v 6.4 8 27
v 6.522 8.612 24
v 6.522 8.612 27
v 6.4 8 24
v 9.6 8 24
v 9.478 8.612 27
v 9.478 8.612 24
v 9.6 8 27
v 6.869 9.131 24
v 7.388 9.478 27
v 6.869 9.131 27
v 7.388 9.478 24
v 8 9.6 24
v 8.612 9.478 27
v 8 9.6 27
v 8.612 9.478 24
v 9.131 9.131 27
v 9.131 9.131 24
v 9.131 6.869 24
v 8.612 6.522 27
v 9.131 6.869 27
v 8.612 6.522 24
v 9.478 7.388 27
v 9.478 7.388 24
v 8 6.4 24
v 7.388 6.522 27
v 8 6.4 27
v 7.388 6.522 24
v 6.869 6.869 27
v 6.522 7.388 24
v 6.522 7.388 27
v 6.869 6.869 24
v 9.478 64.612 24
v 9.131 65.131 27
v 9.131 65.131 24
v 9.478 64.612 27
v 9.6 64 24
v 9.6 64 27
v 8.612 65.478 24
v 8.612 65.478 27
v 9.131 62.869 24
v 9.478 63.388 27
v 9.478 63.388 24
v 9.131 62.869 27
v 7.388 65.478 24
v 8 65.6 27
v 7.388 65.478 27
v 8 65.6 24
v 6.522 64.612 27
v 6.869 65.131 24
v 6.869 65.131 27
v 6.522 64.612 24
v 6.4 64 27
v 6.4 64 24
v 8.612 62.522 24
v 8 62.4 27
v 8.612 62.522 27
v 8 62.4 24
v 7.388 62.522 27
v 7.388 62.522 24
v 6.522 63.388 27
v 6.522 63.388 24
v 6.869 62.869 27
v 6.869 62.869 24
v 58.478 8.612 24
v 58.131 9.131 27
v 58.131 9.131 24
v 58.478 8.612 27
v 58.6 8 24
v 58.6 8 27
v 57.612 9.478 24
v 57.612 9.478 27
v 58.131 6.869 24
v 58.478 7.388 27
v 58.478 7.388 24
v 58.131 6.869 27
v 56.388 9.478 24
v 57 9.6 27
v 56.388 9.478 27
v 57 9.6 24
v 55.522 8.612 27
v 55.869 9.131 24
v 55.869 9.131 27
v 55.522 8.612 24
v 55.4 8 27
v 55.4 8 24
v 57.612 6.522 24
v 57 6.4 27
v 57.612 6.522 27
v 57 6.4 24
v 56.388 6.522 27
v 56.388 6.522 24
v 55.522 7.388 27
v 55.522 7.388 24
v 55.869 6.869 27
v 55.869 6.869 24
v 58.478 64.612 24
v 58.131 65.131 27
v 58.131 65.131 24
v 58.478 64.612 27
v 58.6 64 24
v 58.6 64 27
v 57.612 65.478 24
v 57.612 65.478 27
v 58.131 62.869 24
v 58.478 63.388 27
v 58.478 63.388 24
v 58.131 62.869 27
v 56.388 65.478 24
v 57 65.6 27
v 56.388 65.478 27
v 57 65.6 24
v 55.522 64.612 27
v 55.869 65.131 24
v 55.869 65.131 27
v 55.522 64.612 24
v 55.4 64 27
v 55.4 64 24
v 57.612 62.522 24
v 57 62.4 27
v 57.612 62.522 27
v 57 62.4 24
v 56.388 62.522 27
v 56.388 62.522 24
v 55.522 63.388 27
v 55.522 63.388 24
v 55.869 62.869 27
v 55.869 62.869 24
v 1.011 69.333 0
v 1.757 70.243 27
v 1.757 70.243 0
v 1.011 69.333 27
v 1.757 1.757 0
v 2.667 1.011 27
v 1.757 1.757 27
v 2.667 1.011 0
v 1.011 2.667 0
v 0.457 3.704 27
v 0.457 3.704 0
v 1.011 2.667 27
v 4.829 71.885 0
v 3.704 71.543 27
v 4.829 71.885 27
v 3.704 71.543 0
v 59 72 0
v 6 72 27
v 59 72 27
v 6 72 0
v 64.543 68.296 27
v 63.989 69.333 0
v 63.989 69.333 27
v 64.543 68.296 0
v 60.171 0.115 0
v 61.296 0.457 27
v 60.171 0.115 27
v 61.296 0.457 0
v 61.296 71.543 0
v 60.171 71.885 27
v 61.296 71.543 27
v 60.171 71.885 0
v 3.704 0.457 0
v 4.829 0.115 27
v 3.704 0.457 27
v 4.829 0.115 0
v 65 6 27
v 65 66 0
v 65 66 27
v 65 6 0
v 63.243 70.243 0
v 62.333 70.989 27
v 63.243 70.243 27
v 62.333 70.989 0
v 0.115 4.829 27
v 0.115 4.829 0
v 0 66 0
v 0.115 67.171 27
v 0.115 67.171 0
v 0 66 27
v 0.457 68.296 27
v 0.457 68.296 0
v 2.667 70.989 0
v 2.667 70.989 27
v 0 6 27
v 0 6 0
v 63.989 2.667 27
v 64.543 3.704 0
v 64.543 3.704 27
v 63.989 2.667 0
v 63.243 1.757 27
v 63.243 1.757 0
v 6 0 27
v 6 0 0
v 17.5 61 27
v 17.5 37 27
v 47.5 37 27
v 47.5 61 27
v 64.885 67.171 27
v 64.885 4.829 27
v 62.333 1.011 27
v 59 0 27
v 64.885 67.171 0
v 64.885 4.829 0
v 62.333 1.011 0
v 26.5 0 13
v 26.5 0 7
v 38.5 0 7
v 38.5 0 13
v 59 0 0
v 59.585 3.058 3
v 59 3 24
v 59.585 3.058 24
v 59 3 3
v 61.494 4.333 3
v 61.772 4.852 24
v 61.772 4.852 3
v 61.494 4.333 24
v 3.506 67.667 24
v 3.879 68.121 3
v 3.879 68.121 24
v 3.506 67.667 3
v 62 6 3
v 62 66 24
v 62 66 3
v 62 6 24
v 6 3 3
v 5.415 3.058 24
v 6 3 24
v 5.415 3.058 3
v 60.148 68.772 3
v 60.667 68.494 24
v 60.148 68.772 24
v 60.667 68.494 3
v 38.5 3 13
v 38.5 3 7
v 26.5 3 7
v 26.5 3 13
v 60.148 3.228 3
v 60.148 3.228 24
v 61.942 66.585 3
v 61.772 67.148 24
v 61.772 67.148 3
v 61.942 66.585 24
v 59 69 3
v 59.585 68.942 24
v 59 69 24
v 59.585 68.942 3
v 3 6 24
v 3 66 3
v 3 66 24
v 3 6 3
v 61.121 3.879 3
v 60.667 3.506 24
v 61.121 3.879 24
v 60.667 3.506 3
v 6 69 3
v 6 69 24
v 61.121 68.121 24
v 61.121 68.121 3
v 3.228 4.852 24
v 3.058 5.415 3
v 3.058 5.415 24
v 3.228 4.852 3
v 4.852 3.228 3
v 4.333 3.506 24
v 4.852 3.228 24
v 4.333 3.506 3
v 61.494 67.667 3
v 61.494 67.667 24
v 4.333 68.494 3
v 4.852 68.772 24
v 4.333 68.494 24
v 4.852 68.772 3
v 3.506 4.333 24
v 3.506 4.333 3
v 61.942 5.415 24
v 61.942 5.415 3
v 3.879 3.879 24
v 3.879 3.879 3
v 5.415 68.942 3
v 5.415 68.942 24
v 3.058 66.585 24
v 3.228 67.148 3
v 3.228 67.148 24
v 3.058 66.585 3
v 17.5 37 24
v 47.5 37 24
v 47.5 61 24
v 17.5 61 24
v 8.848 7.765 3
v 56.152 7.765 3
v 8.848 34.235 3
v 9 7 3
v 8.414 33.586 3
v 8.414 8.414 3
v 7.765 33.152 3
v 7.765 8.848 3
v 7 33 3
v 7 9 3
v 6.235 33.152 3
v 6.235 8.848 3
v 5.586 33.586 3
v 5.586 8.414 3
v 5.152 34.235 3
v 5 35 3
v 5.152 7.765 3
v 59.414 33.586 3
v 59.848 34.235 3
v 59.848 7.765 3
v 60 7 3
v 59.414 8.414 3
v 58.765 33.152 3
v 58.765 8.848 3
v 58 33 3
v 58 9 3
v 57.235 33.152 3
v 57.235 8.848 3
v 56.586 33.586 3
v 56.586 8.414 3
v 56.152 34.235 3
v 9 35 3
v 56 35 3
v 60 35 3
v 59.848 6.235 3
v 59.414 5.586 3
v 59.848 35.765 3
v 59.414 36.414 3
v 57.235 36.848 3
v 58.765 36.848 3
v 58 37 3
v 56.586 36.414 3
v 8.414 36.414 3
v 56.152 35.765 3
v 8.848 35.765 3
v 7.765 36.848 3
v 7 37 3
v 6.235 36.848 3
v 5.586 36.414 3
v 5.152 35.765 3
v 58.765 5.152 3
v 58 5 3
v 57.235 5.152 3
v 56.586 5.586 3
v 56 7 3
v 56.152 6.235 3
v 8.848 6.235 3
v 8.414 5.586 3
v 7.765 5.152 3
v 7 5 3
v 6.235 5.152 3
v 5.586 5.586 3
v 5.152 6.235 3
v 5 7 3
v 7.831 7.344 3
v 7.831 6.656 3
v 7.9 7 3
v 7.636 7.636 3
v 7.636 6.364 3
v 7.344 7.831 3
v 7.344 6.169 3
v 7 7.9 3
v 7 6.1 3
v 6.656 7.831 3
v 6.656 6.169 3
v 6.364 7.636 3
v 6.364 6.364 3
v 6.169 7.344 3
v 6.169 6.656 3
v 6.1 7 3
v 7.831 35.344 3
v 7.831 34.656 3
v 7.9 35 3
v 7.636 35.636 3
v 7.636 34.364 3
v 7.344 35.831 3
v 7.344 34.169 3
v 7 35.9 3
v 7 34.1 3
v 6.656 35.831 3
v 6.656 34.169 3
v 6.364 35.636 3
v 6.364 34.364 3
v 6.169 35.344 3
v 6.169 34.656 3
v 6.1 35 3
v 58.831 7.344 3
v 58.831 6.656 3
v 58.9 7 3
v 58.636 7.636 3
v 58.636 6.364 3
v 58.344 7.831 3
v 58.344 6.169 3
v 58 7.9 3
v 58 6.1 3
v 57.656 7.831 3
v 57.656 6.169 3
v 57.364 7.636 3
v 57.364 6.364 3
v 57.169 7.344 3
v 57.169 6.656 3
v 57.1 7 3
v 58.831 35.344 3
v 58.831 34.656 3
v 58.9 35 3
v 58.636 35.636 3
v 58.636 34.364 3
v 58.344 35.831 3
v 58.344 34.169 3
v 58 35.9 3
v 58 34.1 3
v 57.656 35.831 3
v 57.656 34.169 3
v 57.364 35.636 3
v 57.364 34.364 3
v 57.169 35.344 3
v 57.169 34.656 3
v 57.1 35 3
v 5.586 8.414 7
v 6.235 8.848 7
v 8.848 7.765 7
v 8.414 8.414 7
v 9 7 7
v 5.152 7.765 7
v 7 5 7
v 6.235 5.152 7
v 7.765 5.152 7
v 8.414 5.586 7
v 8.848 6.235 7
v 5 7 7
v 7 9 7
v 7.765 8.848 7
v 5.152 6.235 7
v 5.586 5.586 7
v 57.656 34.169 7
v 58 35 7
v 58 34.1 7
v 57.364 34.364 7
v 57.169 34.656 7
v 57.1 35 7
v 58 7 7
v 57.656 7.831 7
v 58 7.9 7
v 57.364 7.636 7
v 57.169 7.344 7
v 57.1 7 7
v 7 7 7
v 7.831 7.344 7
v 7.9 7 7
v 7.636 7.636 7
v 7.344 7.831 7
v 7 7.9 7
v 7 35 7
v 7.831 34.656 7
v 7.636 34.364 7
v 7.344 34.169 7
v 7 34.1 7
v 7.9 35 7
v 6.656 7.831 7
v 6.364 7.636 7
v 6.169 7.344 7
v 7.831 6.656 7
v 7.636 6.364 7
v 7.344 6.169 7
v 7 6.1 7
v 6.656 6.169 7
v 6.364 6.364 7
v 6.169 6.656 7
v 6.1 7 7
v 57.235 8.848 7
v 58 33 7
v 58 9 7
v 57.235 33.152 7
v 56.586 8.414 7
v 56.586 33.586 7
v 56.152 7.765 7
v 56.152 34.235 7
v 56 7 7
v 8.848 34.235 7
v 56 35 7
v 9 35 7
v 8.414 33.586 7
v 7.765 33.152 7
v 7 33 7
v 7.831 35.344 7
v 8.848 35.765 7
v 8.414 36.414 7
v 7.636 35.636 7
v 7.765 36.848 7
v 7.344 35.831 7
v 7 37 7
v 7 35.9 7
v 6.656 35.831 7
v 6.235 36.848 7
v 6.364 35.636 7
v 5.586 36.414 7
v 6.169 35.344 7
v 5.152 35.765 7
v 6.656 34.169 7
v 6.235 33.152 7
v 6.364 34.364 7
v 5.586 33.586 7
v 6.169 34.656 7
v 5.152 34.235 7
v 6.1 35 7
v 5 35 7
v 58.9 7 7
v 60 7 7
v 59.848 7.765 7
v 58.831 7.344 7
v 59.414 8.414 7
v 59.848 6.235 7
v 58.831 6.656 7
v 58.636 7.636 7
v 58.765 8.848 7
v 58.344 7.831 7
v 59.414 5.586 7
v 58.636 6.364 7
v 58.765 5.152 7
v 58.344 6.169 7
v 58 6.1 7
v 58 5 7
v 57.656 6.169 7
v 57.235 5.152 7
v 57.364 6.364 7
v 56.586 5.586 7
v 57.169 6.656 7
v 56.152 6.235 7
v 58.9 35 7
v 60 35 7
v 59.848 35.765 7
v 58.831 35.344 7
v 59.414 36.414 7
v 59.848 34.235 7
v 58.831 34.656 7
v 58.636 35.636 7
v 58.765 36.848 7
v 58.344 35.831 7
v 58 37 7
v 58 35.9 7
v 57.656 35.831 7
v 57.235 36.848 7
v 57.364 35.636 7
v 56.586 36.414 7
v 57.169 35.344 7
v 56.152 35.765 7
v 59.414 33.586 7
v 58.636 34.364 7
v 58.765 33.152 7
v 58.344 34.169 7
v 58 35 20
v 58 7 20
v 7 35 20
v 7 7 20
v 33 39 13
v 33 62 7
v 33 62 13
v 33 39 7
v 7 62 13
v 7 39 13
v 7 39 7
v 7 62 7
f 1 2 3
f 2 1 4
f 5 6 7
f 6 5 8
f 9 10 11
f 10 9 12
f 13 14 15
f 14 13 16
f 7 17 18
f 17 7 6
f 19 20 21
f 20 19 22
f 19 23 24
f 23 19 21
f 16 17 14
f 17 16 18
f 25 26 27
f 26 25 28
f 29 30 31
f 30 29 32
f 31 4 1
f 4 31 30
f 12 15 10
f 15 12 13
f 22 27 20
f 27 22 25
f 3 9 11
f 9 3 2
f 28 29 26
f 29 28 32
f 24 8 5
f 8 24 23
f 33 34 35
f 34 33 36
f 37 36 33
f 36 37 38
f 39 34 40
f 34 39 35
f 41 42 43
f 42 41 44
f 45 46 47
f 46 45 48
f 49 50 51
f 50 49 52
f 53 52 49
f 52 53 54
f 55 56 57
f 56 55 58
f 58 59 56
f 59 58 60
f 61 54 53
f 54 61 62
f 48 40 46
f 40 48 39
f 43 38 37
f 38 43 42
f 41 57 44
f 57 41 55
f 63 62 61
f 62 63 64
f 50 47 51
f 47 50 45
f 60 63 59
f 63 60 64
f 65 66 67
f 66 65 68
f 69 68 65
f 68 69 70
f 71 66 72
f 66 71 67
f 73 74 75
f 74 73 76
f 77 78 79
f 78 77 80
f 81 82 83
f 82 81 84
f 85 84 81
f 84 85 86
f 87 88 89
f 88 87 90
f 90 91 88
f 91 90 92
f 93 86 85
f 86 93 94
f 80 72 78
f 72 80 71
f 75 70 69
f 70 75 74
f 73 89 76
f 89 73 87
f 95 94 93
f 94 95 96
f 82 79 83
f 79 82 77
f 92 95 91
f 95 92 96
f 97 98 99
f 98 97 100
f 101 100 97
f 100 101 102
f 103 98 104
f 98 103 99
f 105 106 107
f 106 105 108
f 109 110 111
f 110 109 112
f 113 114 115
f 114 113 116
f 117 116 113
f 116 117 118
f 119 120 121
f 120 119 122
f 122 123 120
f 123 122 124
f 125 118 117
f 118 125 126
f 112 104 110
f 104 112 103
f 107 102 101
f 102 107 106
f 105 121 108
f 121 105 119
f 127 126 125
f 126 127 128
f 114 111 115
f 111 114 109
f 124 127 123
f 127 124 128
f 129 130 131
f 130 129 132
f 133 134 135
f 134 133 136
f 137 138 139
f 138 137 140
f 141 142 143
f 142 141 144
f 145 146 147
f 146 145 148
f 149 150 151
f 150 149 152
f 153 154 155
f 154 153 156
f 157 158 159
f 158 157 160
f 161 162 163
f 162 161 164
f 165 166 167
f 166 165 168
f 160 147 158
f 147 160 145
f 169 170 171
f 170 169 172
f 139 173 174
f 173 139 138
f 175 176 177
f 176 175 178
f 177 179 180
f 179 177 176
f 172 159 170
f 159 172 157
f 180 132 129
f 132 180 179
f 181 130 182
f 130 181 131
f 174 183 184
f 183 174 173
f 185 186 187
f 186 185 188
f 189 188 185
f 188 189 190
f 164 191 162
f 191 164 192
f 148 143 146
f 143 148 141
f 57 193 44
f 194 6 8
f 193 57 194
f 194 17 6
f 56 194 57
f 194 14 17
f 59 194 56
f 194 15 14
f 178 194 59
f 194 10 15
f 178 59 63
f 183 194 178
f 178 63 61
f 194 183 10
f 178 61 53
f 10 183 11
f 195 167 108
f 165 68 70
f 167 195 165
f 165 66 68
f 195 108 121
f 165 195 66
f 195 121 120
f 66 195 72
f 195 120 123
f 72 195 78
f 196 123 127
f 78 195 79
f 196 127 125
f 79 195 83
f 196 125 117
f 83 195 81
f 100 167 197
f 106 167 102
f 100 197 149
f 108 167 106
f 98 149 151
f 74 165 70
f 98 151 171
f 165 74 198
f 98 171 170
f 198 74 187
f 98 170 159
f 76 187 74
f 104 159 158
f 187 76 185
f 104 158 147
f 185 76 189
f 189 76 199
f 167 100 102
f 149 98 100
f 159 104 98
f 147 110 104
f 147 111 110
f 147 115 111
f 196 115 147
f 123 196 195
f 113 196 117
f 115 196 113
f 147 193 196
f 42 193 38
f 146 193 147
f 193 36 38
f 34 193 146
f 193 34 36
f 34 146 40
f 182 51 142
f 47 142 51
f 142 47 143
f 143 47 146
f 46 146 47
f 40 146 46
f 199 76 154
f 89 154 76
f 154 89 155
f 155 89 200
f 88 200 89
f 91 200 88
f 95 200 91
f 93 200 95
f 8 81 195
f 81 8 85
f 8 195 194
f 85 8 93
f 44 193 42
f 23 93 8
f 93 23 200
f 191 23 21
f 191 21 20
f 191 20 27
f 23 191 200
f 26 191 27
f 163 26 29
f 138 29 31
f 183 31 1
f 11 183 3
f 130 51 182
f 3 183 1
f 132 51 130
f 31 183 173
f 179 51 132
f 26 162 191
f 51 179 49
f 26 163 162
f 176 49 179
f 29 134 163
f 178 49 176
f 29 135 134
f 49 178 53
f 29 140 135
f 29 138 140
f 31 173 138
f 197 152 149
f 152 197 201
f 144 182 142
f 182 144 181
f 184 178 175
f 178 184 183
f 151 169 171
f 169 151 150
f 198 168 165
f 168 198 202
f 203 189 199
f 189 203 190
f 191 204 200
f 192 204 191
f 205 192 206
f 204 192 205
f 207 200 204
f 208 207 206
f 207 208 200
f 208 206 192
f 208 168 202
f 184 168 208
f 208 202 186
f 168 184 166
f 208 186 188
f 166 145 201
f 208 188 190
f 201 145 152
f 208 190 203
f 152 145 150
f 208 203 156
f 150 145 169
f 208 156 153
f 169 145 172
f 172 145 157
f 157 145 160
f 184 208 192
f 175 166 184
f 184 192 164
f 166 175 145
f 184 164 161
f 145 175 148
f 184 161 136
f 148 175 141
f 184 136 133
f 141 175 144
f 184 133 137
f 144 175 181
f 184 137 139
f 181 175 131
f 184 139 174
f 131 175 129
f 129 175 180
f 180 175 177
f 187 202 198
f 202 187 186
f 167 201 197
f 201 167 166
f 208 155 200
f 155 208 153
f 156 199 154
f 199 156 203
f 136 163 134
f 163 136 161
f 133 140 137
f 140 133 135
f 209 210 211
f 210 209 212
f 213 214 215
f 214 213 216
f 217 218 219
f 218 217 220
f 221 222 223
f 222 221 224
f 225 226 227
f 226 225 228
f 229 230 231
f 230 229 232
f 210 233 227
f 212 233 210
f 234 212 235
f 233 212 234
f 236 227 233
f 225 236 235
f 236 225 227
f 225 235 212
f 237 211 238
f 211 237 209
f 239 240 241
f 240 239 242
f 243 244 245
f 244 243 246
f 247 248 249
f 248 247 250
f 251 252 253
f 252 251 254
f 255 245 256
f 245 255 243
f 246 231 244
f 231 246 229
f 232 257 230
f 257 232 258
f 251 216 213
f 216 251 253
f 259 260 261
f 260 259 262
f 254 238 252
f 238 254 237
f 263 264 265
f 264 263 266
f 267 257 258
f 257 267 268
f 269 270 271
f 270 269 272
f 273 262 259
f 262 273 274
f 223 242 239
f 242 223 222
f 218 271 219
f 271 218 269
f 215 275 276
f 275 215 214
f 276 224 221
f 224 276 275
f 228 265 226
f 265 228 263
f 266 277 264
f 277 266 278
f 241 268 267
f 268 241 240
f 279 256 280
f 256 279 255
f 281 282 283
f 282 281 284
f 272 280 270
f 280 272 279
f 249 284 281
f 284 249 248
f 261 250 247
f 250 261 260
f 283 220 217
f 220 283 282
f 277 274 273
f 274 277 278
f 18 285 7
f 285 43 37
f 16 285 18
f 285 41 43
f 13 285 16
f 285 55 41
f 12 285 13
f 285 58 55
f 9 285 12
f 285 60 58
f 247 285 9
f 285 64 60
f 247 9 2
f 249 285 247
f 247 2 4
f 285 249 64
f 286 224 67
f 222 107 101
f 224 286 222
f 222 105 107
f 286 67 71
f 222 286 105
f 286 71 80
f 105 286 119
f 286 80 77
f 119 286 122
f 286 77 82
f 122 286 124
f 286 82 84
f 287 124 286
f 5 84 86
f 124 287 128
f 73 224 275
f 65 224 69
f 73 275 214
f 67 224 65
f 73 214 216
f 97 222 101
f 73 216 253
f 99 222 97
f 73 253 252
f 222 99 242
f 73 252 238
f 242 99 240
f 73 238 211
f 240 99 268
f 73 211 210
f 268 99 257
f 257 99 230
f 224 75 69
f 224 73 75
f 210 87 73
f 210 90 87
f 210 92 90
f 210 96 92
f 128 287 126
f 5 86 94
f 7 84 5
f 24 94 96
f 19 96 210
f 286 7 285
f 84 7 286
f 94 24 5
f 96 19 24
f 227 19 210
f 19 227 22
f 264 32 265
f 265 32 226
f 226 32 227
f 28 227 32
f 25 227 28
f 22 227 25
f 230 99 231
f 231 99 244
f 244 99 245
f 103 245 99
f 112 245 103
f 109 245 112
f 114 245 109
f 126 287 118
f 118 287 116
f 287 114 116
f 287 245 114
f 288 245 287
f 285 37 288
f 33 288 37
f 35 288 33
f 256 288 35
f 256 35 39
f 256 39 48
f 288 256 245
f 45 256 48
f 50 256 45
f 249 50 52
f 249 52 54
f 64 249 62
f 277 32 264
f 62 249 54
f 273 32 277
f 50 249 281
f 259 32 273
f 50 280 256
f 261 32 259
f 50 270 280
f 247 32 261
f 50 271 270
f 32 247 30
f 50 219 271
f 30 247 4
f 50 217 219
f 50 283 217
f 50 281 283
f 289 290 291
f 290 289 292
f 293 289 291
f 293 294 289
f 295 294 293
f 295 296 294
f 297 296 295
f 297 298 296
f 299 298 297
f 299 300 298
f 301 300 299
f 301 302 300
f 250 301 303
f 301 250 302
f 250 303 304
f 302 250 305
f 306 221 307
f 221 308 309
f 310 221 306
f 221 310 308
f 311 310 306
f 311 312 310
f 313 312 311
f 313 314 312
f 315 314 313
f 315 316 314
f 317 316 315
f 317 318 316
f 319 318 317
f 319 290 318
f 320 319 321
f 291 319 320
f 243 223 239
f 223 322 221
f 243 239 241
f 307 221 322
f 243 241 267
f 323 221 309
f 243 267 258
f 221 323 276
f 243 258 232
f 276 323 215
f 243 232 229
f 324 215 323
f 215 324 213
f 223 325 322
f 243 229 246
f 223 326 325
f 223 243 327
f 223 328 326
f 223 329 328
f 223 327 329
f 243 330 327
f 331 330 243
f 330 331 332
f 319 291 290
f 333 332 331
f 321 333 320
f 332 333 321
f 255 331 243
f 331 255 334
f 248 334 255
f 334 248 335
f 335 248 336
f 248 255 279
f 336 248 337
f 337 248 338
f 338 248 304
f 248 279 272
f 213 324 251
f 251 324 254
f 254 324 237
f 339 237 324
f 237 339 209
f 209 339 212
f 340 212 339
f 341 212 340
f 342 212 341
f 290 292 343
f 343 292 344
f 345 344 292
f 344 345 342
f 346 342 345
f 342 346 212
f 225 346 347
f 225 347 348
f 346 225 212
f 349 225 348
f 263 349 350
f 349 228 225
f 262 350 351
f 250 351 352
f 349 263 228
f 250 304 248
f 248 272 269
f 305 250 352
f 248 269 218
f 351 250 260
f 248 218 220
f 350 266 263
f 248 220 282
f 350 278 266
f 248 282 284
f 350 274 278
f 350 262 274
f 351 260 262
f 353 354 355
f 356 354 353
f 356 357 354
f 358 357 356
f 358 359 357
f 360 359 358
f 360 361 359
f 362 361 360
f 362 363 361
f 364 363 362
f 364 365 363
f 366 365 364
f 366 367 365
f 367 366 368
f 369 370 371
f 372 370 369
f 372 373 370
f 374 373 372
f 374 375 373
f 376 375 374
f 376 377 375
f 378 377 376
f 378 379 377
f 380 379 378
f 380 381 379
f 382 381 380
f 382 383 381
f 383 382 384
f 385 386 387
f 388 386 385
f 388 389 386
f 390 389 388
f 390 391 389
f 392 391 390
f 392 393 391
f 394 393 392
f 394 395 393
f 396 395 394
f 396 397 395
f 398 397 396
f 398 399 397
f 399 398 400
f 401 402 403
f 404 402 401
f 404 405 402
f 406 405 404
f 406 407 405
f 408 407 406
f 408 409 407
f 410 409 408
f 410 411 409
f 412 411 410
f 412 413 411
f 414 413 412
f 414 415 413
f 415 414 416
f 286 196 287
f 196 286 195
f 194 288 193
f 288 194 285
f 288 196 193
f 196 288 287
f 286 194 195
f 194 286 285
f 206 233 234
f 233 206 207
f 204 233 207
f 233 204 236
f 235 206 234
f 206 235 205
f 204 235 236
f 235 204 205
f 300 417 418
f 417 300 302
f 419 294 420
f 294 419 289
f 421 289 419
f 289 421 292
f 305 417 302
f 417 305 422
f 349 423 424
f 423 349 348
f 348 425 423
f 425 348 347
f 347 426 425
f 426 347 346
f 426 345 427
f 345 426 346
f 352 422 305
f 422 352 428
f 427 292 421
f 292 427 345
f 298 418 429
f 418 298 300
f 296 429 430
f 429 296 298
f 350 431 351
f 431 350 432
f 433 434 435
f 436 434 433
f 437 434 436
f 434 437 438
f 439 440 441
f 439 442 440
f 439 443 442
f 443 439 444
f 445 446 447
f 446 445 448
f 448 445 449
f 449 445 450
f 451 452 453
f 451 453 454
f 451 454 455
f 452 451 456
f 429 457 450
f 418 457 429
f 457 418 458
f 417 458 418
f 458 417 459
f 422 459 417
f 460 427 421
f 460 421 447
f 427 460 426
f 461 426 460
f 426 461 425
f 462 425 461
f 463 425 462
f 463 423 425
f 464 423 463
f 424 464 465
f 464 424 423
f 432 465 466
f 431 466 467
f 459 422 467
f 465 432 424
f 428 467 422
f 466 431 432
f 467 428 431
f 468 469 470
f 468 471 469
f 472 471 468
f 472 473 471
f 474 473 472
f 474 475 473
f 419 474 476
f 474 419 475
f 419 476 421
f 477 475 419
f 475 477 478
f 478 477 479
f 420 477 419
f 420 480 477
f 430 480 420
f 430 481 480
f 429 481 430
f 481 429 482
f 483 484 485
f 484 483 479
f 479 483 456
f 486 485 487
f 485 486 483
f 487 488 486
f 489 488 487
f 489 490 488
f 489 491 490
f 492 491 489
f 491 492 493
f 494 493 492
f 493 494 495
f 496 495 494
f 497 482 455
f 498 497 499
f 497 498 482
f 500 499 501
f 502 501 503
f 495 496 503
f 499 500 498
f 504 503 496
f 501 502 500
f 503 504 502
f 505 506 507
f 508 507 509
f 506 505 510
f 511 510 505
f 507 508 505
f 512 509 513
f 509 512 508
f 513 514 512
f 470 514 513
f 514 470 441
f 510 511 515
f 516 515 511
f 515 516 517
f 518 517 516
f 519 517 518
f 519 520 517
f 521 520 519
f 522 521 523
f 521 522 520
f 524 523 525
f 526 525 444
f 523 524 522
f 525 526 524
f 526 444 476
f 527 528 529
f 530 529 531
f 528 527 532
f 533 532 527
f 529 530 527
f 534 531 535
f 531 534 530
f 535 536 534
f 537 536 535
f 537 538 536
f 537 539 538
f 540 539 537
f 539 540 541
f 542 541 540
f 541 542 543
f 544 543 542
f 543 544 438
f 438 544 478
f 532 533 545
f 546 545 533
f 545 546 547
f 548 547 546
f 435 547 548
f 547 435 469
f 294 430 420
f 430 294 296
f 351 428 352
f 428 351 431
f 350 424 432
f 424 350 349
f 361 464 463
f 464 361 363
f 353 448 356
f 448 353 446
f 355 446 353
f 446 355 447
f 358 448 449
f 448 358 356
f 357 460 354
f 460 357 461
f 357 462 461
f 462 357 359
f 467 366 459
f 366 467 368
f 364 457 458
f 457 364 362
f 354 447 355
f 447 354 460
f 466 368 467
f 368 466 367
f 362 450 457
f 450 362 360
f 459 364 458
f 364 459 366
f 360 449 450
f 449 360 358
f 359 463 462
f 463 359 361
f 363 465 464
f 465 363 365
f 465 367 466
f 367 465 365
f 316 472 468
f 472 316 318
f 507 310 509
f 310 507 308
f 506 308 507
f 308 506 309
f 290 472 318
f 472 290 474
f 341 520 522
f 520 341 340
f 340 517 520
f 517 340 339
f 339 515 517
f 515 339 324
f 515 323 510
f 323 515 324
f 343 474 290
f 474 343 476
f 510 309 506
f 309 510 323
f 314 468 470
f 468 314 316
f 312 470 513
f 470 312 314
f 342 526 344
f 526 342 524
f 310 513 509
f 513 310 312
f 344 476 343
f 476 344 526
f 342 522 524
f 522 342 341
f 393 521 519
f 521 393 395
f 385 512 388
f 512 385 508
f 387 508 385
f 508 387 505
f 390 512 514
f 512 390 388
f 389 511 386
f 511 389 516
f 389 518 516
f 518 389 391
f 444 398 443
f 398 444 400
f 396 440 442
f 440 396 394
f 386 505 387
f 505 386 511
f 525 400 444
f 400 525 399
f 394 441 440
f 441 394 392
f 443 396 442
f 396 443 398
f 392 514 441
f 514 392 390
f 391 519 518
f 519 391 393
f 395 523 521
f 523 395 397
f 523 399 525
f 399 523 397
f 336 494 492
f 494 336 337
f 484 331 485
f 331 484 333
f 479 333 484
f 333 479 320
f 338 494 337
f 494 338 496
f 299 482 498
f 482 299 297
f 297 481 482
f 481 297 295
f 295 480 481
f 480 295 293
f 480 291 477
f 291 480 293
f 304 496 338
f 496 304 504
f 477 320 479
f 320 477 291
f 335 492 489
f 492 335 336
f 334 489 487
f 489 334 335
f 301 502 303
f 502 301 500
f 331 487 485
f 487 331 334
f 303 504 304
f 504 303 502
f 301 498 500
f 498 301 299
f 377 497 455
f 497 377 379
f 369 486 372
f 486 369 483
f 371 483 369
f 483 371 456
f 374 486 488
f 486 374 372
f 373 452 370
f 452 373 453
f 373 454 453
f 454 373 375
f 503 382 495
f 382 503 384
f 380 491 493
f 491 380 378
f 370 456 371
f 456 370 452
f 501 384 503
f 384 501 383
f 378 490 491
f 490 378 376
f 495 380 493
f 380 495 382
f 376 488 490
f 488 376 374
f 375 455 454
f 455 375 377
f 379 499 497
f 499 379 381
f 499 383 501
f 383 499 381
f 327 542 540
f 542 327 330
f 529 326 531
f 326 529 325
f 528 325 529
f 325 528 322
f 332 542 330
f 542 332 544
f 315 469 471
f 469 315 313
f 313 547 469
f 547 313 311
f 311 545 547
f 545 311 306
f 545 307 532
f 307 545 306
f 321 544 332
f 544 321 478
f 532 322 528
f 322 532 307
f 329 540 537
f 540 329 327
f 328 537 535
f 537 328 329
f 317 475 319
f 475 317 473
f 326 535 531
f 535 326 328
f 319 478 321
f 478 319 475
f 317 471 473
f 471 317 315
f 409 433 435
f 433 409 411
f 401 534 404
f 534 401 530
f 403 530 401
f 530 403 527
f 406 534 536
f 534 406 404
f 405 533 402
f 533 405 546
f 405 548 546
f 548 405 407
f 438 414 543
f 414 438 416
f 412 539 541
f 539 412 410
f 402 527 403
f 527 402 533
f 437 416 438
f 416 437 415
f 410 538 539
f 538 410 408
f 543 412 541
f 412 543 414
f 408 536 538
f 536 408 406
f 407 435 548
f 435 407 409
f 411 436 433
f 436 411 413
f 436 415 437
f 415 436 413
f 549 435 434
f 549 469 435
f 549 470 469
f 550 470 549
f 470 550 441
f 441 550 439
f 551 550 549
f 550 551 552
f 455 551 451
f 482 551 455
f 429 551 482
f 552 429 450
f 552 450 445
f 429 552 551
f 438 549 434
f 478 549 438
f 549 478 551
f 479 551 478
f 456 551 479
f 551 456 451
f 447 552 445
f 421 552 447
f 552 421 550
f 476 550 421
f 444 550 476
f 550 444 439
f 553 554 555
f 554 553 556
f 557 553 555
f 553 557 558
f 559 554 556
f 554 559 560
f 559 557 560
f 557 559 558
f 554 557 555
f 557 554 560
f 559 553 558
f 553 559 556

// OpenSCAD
// Wildlife Telemetry Node — Enclosure v0.1
// Parametrizable — actualizar medidas cuando llegue el vernier
// Autor: Toshi — ISERI IPN Zacatenco

// =====================
// PARÁMETROS (editar aquí)
// =====================

// ESP32 (con pines)
esp32_l = 51;
esp32_w = 28;
esp32_h = 13;

// GPS GY-GPS6MV2
gps_l = 26;
gps_w = 23;
gps_h = 6;

// Holgura interna
margin = 4;

// Pared
wall = 3;

// Dimensiones internas calculadas
inner_l = esp32_l + margin * 2;
inner_w = esp32_w + gps_l + margin * 3;
inner_h = esp32_h + margin * 2;

// Dimensiones externas
ext_l = inner_l + wall * 2;
ext_w = inner_w + wall * 2;
ext_h = inner_h + wall * 2;

// Radio de esquinas
corner_r = 6;

// =====================
// MÓDULOS
// =====================

module rounded_box(l, w, h, r) {
    hull() {
        translate([r, r, 0])       cylinder(h=h, r=r, $fn=32);
        translate([l-r, r, 0])     cylinder(h=h, r=r, $fn=32);
        translate([r, w-r, 0])     cylinder(h=h, r=r, $fn=32);
        translate([l-r, w-r, 0])   cylinder(h=h, r=r, $fn=32);
    }
}

module enclosure_body() {
    difference() {
        // Cuerpo exterior
        rounded_box(ext_l, ext_w, ext_h, corner_r);
        // Vaciado interior
        translate([wall, wall, wall])
            rounded_box(inner_l, inner_w, inner_h, corner_r - wall);
        // Ventana GPS (tapa superior)
        translate([wall + margin + esp32_l/2 - 15, wall + margin + esp32_w + margin/2, ext_h - wall])
            cube([30, 24, wall + 1]);
        // Puerto USB-C (frente)
        translate([wall + margin + esp32_l/2 - 6, -1, wall + 4])
            cube([12, wall + 2, 6]);
        // Agujeros tornillos tapa (4 esquinas M3)
        screw_holes();
    }
}

module screw_holes() {
    inset = 8;
    for (x = [inset, ext_l - inset])
        for (y = [inset, ext_w - inset])
            translate([x, y, ext_h - wall - 1])
                cylinder(h = wall + 2, r = 1.6, $fn = 16);
}

module esp32_placeholder() {
    color("blue", 0.5)
    translate([wall + margin, wall + margin, wall + margin])
        cube([esp32_l, esp32_w, esp32_h]);
}

module gps_placeholder() {
    color("green", 0.5)
    translate([wall + margin, wall + margin + esp32_w + margin, wall + margin])
        cube([gps_l, gps_w, gps_h]);
}

module standoffs() {
    h = margin;
    r = 2;
    positions = [
        [wall + margin, wall + margin],
        [wall + margin + esp32_l, wall + margin],
        [wall + margin, wall + margin + esp32_w],
        [wall + margin + esp32_l, wall + margin + esp32_w]
    ];
    for (p = positions)
        translate([p[0], p[1], wall])
            difference() {
                cylinder(h=h, r=r, $fn=16);
                cylinder(h=h+1, r=0.9, $fn=16);
            }
}

// =====================
// RENDER
// =====================

enclosure_body();
standoffs();
esp32_placeholder();
gps_placeholder();
